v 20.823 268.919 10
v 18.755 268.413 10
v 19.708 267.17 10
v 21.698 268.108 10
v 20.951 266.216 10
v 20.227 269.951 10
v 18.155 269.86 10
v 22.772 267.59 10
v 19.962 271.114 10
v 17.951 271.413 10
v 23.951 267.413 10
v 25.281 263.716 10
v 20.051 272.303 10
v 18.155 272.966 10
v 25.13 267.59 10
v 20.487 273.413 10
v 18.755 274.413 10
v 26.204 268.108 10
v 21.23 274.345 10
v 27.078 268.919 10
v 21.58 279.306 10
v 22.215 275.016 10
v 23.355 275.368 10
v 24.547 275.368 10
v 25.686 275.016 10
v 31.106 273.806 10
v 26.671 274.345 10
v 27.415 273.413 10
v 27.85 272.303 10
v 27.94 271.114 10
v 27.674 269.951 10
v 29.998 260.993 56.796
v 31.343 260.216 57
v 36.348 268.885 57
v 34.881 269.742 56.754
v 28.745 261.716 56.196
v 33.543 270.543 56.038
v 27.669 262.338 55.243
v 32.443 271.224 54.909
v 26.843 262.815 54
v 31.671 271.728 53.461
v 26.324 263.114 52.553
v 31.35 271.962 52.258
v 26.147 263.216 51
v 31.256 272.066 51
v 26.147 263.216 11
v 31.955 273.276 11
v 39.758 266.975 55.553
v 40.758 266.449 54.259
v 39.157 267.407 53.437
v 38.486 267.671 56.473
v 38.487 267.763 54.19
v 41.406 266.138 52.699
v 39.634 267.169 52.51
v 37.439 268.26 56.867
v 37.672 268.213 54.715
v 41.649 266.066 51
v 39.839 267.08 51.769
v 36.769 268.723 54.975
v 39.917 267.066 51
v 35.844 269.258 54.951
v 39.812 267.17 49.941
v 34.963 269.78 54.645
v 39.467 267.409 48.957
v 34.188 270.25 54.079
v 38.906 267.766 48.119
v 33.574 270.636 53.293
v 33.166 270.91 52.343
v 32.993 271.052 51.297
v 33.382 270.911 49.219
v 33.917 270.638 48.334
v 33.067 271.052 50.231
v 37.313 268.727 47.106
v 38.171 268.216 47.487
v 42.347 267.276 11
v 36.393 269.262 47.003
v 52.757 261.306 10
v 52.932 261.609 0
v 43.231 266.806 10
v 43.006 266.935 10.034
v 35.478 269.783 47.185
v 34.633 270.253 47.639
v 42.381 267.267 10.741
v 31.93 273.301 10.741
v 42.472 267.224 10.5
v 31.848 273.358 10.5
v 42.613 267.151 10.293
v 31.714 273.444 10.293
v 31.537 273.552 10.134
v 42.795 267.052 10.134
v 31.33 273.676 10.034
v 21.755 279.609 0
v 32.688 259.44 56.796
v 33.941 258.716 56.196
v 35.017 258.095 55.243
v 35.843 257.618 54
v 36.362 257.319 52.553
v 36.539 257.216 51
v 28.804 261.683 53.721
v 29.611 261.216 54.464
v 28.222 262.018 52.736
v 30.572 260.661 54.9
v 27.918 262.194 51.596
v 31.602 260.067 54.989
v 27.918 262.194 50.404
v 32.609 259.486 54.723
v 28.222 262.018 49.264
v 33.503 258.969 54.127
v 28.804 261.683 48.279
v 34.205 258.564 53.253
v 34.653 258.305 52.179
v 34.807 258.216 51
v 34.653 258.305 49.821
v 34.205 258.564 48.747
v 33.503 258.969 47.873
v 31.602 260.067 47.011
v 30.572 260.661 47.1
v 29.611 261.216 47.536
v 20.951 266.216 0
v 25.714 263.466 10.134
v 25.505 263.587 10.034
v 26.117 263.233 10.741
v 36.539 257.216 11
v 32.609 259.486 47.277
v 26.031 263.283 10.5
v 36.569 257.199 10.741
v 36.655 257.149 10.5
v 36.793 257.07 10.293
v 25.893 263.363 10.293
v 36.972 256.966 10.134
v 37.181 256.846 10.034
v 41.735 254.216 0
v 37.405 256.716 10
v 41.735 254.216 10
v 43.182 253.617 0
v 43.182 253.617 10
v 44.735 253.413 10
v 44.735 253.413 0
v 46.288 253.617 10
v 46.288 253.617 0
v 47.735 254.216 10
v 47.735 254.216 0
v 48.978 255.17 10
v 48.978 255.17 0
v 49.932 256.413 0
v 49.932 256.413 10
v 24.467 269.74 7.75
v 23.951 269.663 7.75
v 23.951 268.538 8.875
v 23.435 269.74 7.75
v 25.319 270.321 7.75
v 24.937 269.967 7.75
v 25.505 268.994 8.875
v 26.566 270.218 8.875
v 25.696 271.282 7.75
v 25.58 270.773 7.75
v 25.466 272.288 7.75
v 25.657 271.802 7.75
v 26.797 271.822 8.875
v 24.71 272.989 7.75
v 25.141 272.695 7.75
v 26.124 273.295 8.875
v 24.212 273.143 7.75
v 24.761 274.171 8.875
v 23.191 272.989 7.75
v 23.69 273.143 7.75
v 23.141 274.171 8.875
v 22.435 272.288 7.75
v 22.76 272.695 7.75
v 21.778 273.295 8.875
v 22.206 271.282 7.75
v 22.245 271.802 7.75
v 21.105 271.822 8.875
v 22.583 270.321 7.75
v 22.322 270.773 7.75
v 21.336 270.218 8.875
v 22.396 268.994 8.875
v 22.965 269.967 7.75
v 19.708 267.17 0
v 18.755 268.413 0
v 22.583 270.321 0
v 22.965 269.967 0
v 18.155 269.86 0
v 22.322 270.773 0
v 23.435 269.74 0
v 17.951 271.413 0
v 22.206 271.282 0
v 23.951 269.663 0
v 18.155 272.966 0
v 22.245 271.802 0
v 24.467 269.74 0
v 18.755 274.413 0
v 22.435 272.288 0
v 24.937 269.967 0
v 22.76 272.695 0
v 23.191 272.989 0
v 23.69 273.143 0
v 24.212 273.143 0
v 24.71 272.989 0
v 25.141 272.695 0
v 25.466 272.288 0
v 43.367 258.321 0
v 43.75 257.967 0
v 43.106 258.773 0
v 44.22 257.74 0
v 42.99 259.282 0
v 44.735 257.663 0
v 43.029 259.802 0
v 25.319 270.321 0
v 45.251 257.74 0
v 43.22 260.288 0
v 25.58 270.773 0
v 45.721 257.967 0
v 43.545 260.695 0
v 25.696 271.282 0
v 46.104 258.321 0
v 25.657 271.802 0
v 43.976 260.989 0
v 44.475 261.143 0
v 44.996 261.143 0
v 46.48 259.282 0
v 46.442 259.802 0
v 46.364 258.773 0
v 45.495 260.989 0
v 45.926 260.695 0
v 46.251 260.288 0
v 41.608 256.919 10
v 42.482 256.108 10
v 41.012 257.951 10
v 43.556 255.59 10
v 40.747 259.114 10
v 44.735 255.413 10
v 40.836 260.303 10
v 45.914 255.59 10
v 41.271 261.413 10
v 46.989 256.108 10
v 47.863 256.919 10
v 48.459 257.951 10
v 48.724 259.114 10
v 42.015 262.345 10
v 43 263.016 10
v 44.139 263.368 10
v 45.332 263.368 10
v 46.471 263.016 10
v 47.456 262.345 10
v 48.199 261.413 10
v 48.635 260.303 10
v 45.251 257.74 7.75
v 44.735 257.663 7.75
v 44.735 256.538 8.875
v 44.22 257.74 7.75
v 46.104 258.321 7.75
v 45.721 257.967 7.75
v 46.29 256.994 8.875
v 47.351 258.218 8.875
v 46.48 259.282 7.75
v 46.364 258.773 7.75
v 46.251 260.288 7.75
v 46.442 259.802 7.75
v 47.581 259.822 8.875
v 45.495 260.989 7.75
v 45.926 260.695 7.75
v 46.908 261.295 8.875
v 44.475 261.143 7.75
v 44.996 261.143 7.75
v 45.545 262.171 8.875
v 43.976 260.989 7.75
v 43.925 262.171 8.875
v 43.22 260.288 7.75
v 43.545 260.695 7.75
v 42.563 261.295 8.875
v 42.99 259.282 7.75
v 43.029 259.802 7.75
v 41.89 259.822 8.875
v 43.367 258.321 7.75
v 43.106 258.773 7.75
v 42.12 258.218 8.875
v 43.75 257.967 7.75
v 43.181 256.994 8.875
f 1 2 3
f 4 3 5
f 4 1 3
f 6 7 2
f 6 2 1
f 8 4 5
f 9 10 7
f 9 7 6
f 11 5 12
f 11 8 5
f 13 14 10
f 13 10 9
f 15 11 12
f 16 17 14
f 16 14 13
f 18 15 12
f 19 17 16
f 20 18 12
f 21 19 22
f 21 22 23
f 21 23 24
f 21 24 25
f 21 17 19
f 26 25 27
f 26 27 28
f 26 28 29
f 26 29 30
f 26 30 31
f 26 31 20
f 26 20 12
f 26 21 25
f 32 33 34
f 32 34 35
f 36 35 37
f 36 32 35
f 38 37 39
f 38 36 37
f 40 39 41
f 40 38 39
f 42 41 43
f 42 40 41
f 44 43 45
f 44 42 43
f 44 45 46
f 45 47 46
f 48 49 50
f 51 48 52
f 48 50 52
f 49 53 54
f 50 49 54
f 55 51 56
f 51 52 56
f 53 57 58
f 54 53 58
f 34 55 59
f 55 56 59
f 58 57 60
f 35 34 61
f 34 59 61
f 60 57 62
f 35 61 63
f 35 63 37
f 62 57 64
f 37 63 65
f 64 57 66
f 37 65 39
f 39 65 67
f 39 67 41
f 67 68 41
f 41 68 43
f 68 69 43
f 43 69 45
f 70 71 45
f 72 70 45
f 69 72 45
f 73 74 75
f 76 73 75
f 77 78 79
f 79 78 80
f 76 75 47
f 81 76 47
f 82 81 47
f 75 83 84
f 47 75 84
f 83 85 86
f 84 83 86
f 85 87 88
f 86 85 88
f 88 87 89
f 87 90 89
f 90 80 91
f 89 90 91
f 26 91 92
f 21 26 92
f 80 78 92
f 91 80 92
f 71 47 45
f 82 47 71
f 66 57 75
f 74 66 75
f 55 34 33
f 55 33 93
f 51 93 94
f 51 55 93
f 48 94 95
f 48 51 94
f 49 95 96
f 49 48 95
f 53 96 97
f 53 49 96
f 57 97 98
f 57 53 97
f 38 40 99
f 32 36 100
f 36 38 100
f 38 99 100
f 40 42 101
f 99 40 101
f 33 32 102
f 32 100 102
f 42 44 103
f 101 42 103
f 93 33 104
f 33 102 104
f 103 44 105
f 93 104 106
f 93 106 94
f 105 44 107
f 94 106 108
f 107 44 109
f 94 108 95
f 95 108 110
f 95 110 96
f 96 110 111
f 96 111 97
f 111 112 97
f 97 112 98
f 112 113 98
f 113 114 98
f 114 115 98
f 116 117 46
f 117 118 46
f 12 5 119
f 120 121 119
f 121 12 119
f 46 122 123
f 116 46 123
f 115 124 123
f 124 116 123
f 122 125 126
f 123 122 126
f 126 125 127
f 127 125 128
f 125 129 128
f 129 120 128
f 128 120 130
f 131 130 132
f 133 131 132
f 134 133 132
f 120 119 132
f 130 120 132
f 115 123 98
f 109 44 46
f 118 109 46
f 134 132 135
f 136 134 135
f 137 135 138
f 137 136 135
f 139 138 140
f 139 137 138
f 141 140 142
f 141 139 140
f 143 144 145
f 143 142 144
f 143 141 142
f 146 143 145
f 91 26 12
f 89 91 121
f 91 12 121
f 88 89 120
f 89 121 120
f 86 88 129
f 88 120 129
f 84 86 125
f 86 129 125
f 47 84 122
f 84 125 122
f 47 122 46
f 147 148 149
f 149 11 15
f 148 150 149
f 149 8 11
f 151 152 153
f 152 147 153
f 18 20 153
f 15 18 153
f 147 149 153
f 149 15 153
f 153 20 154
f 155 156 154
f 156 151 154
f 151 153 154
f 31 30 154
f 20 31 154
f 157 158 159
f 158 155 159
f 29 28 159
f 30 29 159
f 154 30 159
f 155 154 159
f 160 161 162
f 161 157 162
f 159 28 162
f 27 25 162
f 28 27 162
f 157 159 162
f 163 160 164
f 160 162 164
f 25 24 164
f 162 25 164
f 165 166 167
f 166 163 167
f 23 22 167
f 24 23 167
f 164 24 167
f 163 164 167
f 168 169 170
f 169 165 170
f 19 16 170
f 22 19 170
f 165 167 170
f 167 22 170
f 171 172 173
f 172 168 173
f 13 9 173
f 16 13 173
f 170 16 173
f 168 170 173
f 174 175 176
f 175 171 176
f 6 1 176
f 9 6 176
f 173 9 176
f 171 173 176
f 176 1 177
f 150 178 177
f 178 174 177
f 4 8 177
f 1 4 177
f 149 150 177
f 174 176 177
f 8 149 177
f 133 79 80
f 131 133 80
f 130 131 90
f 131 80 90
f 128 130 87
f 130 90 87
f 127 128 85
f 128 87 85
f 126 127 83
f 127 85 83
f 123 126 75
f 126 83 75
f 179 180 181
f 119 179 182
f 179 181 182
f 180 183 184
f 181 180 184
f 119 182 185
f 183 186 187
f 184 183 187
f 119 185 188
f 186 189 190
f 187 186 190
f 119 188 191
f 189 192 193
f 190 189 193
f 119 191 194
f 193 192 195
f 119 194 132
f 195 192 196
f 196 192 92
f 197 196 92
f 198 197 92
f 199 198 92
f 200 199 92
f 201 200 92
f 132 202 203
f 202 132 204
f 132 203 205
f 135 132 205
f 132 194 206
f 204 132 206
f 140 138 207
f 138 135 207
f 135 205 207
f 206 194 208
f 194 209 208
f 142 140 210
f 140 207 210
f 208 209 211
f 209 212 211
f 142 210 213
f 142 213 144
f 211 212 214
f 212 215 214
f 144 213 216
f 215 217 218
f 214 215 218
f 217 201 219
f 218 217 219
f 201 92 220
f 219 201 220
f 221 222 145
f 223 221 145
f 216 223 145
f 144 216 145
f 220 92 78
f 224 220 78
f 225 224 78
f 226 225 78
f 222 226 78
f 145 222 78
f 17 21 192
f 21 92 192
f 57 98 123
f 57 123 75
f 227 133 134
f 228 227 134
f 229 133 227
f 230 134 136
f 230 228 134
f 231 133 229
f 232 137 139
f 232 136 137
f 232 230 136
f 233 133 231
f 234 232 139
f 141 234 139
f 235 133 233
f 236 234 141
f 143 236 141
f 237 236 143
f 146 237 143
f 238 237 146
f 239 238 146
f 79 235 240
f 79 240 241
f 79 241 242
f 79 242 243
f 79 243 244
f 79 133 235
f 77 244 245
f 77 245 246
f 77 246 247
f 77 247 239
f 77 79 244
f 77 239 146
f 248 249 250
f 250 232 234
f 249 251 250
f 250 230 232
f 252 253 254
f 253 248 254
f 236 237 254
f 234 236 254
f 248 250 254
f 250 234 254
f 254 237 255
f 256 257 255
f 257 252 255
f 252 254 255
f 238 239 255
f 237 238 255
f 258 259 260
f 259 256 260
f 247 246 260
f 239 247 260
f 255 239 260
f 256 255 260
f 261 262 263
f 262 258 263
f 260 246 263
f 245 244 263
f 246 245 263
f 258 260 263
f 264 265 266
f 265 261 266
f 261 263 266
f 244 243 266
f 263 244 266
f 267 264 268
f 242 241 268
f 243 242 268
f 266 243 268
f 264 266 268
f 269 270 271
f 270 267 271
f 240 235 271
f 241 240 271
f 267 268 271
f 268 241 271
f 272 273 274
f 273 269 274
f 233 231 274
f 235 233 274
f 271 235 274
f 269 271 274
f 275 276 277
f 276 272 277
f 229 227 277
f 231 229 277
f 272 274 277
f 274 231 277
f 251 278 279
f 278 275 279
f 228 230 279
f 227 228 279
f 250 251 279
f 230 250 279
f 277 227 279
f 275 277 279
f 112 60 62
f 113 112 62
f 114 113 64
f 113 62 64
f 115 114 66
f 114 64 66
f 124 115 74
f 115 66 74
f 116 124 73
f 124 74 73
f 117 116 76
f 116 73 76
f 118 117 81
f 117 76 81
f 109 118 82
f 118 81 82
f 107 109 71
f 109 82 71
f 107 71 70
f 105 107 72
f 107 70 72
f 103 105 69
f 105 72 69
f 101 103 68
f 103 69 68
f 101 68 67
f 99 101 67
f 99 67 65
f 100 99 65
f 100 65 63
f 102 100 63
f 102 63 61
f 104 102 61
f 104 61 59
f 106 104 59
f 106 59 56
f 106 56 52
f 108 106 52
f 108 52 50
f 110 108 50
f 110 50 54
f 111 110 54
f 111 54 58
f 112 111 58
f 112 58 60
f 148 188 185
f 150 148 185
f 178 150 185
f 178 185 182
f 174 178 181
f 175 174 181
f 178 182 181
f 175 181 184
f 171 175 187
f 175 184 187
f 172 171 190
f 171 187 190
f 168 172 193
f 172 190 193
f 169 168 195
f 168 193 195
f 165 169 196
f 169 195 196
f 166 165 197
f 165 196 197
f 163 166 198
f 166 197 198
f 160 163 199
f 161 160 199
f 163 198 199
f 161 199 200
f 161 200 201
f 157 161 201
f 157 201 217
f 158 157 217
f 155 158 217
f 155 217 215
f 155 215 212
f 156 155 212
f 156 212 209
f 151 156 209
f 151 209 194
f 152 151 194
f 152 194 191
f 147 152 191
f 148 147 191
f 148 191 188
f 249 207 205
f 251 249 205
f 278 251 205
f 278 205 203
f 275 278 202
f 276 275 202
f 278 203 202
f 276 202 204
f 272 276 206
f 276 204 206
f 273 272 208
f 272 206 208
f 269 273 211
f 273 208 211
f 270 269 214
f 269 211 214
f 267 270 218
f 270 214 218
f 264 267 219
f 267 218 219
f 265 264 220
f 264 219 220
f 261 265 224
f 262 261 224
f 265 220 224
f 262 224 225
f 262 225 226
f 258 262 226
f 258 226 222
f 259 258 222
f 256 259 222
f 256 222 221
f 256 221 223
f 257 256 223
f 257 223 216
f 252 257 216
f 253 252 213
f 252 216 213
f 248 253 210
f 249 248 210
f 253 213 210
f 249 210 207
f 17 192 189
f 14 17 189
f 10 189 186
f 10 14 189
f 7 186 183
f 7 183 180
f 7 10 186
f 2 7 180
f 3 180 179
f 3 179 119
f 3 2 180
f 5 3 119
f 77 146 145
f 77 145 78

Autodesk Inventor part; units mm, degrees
ref_plane "YZ Plane" through (0, 0, 0) normal (1, 0, 0) x (0, 1, 0)
ref_plane "XZ Plane" through (0, 0, 0) normal (0, 1, 0) x (-1, 0, 0)
ref_plane "XY Plane" through (0, 0, 0) normal (0, 0, 1) x (1, 0, 0)
ref_plane "Work Plane1" through (0, 0, 0) normal (0, 0, 1) x (1, 0, 0)
sketch "Sketch1" plane through (0, 0, 0) normal (0, 0, 1) x (1, 0, 0)
  line L0 (39.878985, 283.001047) -> (46.807188, 279.001047)
  line L1 (118.687297, 237.501047) -> (-32.001123, 324.501047)
  line L2 (118.687297, 237.501047) -> (112.687297, 227.108743)
  line L3 (-38.001123, 314.108743) -> (112.687297, 227.108743)
  line L4 (-32.001123, 324.501047) -> (-38.001123, 314.108743)
  line L5 (40.807188, 268.608743) -> (46.807188, 279.001047)
  line L6 (33.878985, 272.608743) -> (39.878985, 283.001047)
  line L7 (40.807188, 268.608743) -> (33.878985, 272.608743)
  circle A0 centre (68.259454, 214.654052) radius 27.5 construction
  line L8 (52.931544, 261.608743) -> (21.754629, 279.608743)
  line L9 (21.754629, 279.608743) -> (15.754629, 269.216438)
  line L10 (15.754629, 269.216438) -> (46.931544, 251.216438)
  line L11 (46.931544, 251.216438) -> (52.931544, 261.608743)
  point P0 (0, 0)
  dimension "d0" = 55
  dimension "d1" = 12
  dimension "d2" = 14
  dimension "d3" = 14
sketch "Sketch1 outline for Extrusion1" plane through (0, 0, 0) normal (0, 0, 1) x (1, 0, 0)
  line L0 (15.754629, 269.216438) -> (46.931544, 251.216438)
  line L1 (21.754629, 279.608743) -> (15.754629, 269.216438)
  line L2 (52.931544, 261.608743) -> (21.754629, 279.608743)
  line L3 (46.931544, 251.216438) -> (52.931544, 261.608743)
extrude "Extrusion1" add sketch "Sketch1 outline for Extrusion1" along normal blind 10
fillet "Fillet1" radius 6 2 edges at (15.7546, 269.2164, 5) (46.9315, 251.2164, 5)
sketch "Sketch2" plane through (0, 0, 10) normal (0, 0, 1) x (1, 0, 0)
  arc A0 (18.754629, 274.41259) -> (20.950782, 266.216438) centre (23.950782, 271.41259) ccw
  arc A1 (41.735391, 254.216438) -> (49.931544, 256.41259) centre (44.735391, 259.41259) ccw
  point P0 (0, 0)
hole "Hole1" at (23.950782, 271.41259, 10) at (44.735391, 259.41259, 10) direction (0, 0, -1) diameter 3.5 end through all countersink diameter 8 countersink angle 90
sketch "Sketch3" plane through (0, 0, 10) normal (0, 0, 1) x (1, 0, 0)
  line L0 (52.931544, 261.608743) -> (21.754629, 279.608743)
  line L1 (42.539239, 267.608743) -> (32.146934, 273.608743)
  line L2 (32.146934, 273.608743) -> (26.146934, 263.216438)
  line L3 (26.146934, 263.216438) -> (36.539239, 257.216438)
  line L4 (36.539239, 257.216438) -> (42.539239, 267.608743)
  line L5 (21.754629, 279.608743) -> (18.754629, 274.41259)
  line L6 (49.931544, 256.41259) -> (52.931544, 261.608743)
  point P0 (0, 0)
  dimension "d14" = 12
  dimension "d15" = 12
  dimension "d16" = 12
sketch "Sketch3 outline for Extrusion2" plane through (0, 0, 10) normal (0, 0, 1) x (1, 0, 0)
  line L0 (26.146934, 263.216438) -> (36.539239, 257.216438)
  line L1 (32.146934, 273.608743) -> (26.146934, 263.216438)
  line L2 (42.539239, 267.608743) -> (32.146934, 273.608743)
  line L3 (36.539239, 257.216438) -> (42.539239, 267.608743)
extrude "Extrusion2" add sketch "Sketch3 outline for Extrusion2" along normal blind 47
sketch "Sketch4" plane through (21.754629, 279.608743, 10) normal (0.5, 0.8660254, 0) x (0.8660254, -0.5, 0)
  circle A0 centre (18, -41) radius 4 projected
  point P0 (120.96431, 10)
sketch "Sketch4 outline for Extrusion3" plane through (21.754629, 279.608743, 10) normal (0.5, 0.8660254, 0) x (0.8660254, -0.5, 0)
  circle A0 centre (18, -41) radius 4
extrude "Extrusion3" cut sketch "Sketch4 outline for Extrusion3" against normal through all
fillet "Fillet2" radius 6 2 edges at (39.5392, 262.4126, 57) (29.1469, 268.4126, 57)
fillet "Fillet3" radius 1 2 edges at (29.1469, 268.4126, 10) (39.5392, 262.4126, 10)
draft "FaceDraft1" angle 2 pull direction (0, 0, 1) faces at (37.48227, 270.528385, 23.009722) fixed edges at (37.343087, 270.608743, 0)
equation "\"d2\" = d3"
equation "\"d15\" = d16"
properties part number "backcover_clamp"
